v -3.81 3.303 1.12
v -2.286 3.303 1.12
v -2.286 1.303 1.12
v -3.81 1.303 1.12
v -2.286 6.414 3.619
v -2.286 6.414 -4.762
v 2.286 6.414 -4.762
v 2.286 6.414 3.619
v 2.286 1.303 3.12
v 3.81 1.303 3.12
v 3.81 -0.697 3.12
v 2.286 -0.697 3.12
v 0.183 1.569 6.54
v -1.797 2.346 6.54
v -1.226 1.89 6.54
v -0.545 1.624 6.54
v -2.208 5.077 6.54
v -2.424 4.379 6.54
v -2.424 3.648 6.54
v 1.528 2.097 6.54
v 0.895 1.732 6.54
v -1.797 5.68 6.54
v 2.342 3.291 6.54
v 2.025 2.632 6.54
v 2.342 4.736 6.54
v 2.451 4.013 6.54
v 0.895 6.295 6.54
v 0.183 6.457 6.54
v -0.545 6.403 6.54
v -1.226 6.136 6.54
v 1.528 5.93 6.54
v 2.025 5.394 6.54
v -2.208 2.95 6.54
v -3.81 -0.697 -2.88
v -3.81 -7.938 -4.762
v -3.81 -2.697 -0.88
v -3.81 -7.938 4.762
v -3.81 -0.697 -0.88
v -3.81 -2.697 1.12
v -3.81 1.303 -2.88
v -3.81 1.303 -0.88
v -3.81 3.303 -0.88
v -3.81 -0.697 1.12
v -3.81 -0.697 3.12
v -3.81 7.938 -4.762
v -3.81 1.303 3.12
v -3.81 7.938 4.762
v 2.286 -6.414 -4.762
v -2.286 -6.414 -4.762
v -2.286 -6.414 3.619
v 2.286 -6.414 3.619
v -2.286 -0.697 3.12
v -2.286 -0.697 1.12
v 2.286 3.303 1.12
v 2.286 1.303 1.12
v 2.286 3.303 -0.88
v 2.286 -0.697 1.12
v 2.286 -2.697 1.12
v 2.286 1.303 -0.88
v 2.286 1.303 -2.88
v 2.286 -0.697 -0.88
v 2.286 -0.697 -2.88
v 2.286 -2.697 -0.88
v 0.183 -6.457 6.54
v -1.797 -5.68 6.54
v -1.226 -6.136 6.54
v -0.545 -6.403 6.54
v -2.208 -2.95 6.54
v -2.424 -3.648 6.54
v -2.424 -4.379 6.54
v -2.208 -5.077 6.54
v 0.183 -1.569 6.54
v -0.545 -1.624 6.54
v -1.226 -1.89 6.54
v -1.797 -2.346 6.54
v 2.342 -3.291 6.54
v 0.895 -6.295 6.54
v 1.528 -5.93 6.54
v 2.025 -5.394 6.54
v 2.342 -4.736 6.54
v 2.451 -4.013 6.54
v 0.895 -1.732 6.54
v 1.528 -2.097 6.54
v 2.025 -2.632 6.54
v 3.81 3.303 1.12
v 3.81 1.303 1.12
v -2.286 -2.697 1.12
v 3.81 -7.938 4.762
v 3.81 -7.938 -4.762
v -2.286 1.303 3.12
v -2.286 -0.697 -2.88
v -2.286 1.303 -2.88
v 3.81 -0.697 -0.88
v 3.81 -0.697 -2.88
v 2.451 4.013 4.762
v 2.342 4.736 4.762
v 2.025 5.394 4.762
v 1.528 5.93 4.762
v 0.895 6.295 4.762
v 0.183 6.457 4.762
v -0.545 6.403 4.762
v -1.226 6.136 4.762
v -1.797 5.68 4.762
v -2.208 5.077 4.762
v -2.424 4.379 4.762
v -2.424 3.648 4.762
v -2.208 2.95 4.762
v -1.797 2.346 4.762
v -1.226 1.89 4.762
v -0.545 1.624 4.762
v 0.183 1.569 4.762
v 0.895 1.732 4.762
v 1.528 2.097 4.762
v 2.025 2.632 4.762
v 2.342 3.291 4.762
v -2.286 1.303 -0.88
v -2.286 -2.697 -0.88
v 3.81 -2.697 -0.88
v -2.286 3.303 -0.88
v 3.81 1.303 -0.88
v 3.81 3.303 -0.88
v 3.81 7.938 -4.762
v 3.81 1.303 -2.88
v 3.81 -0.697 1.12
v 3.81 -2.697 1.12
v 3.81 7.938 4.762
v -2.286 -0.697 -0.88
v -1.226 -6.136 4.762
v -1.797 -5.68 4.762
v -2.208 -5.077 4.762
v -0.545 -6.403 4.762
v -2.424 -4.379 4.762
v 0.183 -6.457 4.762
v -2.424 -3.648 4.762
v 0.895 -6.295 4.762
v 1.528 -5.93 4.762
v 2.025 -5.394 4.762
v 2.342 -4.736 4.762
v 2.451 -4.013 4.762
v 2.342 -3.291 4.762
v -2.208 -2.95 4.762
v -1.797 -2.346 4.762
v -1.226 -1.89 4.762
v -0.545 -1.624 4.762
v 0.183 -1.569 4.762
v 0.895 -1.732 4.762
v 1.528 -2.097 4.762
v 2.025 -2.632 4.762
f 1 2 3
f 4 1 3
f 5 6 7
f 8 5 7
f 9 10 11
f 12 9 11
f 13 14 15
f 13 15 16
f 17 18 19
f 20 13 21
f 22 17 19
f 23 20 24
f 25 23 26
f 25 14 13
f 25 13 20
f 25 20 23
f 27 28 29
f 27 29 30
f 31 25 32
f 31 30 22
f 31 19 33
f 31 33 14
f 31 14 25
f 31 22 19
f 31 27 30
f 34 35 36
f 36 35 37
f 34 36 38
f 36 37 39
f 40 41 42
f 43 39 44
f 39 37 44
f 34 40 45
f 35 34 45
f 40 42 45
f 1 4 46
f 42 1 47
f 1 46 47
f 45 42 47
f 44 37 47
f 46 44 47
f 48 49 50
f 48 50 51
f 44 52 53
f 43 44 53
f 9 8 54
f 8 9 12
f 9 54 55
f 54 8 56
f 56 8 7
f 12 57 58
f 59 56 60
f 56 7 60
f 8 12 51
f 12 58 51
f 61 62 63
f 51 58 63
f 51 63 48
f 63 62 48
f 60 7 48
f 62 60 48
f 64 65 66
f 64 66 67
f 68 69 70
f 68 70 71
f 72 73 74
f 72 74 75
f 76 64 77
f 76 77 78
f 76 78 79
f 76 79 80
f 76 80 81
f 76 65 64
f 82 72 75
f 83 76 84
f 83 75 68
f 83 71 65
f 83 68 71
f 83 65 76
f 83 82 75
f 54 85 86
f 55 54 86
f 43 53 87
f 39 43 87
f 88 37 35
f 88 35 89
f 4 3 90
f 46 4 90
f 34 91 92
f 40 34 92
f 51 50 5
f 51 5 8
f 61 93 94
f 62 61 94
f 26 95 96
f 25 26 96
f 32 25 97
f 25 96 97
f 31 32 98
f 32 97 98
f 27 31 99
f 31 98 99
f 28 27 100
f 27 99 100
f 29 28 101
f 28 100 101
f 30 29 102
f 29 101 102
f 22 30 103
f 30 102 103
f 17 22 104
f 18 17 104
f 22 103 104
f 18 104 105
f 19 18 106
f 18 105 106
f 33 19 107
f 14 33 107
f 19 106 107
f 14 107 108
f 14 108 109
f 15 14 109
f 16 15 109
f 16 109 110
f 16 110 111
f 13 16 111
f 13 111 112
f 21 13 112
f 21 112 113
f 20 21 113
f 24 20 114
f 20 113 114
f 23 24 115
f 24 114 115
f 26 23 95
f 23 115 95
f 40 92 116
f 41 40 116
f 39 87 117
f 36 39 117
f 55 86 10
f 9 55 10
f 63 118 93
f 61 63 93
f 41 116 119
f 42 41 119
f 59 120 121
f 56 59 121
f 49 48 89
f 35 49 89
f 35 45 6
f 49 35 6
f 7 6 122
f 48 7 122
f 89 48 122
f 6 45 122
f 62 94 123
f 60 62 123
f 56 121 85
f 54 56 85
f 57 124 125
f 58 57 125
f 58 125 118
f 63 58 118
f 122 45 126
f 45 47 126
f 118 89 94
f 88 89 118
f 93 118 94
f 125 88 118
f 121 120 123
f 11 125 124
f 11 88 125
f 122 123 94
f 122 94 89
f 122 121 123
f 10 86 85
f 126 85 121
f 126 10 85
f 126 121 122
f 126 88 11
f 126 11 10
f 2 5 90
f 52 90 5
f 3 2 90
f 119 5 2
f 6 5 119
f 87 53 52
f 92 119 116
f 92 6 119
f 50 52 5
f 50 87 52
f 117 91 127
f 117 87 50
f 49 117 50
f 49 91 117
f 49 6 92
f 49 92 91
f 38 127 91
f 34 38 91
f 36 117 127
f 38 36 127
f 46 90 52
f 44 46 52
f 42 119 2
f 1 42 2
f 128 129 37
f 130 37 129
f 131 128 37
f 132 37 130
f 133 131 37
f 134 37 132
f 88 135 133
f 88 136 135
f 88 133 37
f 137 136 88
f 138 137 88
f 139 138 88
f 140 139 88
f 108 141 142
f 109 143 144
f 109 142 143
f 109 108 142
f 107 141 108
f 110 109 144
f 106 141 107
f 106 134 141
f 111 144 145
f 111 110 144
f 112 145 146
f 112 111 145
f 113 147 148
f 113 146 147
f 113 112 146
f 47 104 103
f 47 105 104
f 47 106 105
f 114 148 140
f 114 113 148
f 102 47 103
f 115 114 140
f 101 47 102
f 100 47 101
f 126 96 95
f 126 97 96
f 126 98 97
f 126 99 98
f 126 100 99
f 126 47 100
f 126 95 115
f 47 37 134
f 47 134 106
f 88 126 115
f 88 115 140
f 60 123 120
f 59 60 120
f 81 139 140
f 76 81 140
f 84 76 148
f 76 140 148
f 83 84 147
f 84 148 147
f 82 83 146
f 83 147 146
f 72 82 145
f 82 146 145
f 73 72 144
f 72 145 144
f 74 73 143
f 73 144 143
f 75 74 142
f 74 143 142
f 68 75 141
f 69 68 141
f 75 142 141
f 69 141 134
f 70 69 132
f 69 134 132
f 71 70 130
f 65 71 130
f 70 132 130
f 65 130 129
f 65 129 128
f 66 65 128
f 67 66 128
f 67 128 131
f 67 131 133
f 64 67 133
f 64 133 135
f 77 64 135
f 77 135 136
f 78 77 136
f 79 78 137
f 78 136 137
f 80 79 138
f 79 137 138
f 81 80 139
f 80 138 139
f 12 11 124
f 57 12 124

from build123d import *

# Parameters (mm, degrees)
F0_W     = 7.62
F0_H     = 15.875
F1_DEPTH = 4.7625
F2_R     = 2.4511
F3_DEPTH = 1.778
F4_W     = 4.572
F4_H     = 12.827
F5_DEPTH = 8.382
F7_DEPTH = 7.77


with BuildPart() as f1:
    # F0 (on Top) → F1 (new body, symmetric)
    with BuildSketch(Plane.XY):
        Rectangle(F0_W, F0_H)
    extrude(amount=F1_DEPTH, both=True)

    # F2 (on face) → F3 (join)
    with BuildSketch(Plane.XY.offset(4.7625)):
        with Locations((0, 4.0132)):
            Circle(F2_R)
        with Locations((0, -4.0132)):
            Circle(F2_R)
    extrude(amount=F3_DEPTH)

    # F4 (on face) → F5 (cut)
    with BuildSketch(Plane(origin=(0, 0, -4.7625), x_dir=(1, 0, 0), z_dir=(0, 0, -1))):
        Rectangle(F4_W, F4_H)
    extrude(amount=-F5_DEPTH, mode=Mode.SUBTRACT)

    # F6 (on face) → F7 (cut)
    with BuildSketch(Plane.YZ.offset(3.81)):
        Polygon((1.302941, 3.120179), (-0.697059, 3.120179), (-0.697059, 1.120179), (-2.697059, 1.120179), (-2.697059, -0.879821), (-0.697059, -0.879821), (-0.697059, -2.879821), (1.302941, -2.879821), (1.302941, -0.879821), (3.302941, -0.879821), (3.302941, 1.120179), (1.302941, 1.120179), align=None)
    extrude(amount=-F7_DEPTH, mode=Mode.SUBTRACT)


solid = f1.part
